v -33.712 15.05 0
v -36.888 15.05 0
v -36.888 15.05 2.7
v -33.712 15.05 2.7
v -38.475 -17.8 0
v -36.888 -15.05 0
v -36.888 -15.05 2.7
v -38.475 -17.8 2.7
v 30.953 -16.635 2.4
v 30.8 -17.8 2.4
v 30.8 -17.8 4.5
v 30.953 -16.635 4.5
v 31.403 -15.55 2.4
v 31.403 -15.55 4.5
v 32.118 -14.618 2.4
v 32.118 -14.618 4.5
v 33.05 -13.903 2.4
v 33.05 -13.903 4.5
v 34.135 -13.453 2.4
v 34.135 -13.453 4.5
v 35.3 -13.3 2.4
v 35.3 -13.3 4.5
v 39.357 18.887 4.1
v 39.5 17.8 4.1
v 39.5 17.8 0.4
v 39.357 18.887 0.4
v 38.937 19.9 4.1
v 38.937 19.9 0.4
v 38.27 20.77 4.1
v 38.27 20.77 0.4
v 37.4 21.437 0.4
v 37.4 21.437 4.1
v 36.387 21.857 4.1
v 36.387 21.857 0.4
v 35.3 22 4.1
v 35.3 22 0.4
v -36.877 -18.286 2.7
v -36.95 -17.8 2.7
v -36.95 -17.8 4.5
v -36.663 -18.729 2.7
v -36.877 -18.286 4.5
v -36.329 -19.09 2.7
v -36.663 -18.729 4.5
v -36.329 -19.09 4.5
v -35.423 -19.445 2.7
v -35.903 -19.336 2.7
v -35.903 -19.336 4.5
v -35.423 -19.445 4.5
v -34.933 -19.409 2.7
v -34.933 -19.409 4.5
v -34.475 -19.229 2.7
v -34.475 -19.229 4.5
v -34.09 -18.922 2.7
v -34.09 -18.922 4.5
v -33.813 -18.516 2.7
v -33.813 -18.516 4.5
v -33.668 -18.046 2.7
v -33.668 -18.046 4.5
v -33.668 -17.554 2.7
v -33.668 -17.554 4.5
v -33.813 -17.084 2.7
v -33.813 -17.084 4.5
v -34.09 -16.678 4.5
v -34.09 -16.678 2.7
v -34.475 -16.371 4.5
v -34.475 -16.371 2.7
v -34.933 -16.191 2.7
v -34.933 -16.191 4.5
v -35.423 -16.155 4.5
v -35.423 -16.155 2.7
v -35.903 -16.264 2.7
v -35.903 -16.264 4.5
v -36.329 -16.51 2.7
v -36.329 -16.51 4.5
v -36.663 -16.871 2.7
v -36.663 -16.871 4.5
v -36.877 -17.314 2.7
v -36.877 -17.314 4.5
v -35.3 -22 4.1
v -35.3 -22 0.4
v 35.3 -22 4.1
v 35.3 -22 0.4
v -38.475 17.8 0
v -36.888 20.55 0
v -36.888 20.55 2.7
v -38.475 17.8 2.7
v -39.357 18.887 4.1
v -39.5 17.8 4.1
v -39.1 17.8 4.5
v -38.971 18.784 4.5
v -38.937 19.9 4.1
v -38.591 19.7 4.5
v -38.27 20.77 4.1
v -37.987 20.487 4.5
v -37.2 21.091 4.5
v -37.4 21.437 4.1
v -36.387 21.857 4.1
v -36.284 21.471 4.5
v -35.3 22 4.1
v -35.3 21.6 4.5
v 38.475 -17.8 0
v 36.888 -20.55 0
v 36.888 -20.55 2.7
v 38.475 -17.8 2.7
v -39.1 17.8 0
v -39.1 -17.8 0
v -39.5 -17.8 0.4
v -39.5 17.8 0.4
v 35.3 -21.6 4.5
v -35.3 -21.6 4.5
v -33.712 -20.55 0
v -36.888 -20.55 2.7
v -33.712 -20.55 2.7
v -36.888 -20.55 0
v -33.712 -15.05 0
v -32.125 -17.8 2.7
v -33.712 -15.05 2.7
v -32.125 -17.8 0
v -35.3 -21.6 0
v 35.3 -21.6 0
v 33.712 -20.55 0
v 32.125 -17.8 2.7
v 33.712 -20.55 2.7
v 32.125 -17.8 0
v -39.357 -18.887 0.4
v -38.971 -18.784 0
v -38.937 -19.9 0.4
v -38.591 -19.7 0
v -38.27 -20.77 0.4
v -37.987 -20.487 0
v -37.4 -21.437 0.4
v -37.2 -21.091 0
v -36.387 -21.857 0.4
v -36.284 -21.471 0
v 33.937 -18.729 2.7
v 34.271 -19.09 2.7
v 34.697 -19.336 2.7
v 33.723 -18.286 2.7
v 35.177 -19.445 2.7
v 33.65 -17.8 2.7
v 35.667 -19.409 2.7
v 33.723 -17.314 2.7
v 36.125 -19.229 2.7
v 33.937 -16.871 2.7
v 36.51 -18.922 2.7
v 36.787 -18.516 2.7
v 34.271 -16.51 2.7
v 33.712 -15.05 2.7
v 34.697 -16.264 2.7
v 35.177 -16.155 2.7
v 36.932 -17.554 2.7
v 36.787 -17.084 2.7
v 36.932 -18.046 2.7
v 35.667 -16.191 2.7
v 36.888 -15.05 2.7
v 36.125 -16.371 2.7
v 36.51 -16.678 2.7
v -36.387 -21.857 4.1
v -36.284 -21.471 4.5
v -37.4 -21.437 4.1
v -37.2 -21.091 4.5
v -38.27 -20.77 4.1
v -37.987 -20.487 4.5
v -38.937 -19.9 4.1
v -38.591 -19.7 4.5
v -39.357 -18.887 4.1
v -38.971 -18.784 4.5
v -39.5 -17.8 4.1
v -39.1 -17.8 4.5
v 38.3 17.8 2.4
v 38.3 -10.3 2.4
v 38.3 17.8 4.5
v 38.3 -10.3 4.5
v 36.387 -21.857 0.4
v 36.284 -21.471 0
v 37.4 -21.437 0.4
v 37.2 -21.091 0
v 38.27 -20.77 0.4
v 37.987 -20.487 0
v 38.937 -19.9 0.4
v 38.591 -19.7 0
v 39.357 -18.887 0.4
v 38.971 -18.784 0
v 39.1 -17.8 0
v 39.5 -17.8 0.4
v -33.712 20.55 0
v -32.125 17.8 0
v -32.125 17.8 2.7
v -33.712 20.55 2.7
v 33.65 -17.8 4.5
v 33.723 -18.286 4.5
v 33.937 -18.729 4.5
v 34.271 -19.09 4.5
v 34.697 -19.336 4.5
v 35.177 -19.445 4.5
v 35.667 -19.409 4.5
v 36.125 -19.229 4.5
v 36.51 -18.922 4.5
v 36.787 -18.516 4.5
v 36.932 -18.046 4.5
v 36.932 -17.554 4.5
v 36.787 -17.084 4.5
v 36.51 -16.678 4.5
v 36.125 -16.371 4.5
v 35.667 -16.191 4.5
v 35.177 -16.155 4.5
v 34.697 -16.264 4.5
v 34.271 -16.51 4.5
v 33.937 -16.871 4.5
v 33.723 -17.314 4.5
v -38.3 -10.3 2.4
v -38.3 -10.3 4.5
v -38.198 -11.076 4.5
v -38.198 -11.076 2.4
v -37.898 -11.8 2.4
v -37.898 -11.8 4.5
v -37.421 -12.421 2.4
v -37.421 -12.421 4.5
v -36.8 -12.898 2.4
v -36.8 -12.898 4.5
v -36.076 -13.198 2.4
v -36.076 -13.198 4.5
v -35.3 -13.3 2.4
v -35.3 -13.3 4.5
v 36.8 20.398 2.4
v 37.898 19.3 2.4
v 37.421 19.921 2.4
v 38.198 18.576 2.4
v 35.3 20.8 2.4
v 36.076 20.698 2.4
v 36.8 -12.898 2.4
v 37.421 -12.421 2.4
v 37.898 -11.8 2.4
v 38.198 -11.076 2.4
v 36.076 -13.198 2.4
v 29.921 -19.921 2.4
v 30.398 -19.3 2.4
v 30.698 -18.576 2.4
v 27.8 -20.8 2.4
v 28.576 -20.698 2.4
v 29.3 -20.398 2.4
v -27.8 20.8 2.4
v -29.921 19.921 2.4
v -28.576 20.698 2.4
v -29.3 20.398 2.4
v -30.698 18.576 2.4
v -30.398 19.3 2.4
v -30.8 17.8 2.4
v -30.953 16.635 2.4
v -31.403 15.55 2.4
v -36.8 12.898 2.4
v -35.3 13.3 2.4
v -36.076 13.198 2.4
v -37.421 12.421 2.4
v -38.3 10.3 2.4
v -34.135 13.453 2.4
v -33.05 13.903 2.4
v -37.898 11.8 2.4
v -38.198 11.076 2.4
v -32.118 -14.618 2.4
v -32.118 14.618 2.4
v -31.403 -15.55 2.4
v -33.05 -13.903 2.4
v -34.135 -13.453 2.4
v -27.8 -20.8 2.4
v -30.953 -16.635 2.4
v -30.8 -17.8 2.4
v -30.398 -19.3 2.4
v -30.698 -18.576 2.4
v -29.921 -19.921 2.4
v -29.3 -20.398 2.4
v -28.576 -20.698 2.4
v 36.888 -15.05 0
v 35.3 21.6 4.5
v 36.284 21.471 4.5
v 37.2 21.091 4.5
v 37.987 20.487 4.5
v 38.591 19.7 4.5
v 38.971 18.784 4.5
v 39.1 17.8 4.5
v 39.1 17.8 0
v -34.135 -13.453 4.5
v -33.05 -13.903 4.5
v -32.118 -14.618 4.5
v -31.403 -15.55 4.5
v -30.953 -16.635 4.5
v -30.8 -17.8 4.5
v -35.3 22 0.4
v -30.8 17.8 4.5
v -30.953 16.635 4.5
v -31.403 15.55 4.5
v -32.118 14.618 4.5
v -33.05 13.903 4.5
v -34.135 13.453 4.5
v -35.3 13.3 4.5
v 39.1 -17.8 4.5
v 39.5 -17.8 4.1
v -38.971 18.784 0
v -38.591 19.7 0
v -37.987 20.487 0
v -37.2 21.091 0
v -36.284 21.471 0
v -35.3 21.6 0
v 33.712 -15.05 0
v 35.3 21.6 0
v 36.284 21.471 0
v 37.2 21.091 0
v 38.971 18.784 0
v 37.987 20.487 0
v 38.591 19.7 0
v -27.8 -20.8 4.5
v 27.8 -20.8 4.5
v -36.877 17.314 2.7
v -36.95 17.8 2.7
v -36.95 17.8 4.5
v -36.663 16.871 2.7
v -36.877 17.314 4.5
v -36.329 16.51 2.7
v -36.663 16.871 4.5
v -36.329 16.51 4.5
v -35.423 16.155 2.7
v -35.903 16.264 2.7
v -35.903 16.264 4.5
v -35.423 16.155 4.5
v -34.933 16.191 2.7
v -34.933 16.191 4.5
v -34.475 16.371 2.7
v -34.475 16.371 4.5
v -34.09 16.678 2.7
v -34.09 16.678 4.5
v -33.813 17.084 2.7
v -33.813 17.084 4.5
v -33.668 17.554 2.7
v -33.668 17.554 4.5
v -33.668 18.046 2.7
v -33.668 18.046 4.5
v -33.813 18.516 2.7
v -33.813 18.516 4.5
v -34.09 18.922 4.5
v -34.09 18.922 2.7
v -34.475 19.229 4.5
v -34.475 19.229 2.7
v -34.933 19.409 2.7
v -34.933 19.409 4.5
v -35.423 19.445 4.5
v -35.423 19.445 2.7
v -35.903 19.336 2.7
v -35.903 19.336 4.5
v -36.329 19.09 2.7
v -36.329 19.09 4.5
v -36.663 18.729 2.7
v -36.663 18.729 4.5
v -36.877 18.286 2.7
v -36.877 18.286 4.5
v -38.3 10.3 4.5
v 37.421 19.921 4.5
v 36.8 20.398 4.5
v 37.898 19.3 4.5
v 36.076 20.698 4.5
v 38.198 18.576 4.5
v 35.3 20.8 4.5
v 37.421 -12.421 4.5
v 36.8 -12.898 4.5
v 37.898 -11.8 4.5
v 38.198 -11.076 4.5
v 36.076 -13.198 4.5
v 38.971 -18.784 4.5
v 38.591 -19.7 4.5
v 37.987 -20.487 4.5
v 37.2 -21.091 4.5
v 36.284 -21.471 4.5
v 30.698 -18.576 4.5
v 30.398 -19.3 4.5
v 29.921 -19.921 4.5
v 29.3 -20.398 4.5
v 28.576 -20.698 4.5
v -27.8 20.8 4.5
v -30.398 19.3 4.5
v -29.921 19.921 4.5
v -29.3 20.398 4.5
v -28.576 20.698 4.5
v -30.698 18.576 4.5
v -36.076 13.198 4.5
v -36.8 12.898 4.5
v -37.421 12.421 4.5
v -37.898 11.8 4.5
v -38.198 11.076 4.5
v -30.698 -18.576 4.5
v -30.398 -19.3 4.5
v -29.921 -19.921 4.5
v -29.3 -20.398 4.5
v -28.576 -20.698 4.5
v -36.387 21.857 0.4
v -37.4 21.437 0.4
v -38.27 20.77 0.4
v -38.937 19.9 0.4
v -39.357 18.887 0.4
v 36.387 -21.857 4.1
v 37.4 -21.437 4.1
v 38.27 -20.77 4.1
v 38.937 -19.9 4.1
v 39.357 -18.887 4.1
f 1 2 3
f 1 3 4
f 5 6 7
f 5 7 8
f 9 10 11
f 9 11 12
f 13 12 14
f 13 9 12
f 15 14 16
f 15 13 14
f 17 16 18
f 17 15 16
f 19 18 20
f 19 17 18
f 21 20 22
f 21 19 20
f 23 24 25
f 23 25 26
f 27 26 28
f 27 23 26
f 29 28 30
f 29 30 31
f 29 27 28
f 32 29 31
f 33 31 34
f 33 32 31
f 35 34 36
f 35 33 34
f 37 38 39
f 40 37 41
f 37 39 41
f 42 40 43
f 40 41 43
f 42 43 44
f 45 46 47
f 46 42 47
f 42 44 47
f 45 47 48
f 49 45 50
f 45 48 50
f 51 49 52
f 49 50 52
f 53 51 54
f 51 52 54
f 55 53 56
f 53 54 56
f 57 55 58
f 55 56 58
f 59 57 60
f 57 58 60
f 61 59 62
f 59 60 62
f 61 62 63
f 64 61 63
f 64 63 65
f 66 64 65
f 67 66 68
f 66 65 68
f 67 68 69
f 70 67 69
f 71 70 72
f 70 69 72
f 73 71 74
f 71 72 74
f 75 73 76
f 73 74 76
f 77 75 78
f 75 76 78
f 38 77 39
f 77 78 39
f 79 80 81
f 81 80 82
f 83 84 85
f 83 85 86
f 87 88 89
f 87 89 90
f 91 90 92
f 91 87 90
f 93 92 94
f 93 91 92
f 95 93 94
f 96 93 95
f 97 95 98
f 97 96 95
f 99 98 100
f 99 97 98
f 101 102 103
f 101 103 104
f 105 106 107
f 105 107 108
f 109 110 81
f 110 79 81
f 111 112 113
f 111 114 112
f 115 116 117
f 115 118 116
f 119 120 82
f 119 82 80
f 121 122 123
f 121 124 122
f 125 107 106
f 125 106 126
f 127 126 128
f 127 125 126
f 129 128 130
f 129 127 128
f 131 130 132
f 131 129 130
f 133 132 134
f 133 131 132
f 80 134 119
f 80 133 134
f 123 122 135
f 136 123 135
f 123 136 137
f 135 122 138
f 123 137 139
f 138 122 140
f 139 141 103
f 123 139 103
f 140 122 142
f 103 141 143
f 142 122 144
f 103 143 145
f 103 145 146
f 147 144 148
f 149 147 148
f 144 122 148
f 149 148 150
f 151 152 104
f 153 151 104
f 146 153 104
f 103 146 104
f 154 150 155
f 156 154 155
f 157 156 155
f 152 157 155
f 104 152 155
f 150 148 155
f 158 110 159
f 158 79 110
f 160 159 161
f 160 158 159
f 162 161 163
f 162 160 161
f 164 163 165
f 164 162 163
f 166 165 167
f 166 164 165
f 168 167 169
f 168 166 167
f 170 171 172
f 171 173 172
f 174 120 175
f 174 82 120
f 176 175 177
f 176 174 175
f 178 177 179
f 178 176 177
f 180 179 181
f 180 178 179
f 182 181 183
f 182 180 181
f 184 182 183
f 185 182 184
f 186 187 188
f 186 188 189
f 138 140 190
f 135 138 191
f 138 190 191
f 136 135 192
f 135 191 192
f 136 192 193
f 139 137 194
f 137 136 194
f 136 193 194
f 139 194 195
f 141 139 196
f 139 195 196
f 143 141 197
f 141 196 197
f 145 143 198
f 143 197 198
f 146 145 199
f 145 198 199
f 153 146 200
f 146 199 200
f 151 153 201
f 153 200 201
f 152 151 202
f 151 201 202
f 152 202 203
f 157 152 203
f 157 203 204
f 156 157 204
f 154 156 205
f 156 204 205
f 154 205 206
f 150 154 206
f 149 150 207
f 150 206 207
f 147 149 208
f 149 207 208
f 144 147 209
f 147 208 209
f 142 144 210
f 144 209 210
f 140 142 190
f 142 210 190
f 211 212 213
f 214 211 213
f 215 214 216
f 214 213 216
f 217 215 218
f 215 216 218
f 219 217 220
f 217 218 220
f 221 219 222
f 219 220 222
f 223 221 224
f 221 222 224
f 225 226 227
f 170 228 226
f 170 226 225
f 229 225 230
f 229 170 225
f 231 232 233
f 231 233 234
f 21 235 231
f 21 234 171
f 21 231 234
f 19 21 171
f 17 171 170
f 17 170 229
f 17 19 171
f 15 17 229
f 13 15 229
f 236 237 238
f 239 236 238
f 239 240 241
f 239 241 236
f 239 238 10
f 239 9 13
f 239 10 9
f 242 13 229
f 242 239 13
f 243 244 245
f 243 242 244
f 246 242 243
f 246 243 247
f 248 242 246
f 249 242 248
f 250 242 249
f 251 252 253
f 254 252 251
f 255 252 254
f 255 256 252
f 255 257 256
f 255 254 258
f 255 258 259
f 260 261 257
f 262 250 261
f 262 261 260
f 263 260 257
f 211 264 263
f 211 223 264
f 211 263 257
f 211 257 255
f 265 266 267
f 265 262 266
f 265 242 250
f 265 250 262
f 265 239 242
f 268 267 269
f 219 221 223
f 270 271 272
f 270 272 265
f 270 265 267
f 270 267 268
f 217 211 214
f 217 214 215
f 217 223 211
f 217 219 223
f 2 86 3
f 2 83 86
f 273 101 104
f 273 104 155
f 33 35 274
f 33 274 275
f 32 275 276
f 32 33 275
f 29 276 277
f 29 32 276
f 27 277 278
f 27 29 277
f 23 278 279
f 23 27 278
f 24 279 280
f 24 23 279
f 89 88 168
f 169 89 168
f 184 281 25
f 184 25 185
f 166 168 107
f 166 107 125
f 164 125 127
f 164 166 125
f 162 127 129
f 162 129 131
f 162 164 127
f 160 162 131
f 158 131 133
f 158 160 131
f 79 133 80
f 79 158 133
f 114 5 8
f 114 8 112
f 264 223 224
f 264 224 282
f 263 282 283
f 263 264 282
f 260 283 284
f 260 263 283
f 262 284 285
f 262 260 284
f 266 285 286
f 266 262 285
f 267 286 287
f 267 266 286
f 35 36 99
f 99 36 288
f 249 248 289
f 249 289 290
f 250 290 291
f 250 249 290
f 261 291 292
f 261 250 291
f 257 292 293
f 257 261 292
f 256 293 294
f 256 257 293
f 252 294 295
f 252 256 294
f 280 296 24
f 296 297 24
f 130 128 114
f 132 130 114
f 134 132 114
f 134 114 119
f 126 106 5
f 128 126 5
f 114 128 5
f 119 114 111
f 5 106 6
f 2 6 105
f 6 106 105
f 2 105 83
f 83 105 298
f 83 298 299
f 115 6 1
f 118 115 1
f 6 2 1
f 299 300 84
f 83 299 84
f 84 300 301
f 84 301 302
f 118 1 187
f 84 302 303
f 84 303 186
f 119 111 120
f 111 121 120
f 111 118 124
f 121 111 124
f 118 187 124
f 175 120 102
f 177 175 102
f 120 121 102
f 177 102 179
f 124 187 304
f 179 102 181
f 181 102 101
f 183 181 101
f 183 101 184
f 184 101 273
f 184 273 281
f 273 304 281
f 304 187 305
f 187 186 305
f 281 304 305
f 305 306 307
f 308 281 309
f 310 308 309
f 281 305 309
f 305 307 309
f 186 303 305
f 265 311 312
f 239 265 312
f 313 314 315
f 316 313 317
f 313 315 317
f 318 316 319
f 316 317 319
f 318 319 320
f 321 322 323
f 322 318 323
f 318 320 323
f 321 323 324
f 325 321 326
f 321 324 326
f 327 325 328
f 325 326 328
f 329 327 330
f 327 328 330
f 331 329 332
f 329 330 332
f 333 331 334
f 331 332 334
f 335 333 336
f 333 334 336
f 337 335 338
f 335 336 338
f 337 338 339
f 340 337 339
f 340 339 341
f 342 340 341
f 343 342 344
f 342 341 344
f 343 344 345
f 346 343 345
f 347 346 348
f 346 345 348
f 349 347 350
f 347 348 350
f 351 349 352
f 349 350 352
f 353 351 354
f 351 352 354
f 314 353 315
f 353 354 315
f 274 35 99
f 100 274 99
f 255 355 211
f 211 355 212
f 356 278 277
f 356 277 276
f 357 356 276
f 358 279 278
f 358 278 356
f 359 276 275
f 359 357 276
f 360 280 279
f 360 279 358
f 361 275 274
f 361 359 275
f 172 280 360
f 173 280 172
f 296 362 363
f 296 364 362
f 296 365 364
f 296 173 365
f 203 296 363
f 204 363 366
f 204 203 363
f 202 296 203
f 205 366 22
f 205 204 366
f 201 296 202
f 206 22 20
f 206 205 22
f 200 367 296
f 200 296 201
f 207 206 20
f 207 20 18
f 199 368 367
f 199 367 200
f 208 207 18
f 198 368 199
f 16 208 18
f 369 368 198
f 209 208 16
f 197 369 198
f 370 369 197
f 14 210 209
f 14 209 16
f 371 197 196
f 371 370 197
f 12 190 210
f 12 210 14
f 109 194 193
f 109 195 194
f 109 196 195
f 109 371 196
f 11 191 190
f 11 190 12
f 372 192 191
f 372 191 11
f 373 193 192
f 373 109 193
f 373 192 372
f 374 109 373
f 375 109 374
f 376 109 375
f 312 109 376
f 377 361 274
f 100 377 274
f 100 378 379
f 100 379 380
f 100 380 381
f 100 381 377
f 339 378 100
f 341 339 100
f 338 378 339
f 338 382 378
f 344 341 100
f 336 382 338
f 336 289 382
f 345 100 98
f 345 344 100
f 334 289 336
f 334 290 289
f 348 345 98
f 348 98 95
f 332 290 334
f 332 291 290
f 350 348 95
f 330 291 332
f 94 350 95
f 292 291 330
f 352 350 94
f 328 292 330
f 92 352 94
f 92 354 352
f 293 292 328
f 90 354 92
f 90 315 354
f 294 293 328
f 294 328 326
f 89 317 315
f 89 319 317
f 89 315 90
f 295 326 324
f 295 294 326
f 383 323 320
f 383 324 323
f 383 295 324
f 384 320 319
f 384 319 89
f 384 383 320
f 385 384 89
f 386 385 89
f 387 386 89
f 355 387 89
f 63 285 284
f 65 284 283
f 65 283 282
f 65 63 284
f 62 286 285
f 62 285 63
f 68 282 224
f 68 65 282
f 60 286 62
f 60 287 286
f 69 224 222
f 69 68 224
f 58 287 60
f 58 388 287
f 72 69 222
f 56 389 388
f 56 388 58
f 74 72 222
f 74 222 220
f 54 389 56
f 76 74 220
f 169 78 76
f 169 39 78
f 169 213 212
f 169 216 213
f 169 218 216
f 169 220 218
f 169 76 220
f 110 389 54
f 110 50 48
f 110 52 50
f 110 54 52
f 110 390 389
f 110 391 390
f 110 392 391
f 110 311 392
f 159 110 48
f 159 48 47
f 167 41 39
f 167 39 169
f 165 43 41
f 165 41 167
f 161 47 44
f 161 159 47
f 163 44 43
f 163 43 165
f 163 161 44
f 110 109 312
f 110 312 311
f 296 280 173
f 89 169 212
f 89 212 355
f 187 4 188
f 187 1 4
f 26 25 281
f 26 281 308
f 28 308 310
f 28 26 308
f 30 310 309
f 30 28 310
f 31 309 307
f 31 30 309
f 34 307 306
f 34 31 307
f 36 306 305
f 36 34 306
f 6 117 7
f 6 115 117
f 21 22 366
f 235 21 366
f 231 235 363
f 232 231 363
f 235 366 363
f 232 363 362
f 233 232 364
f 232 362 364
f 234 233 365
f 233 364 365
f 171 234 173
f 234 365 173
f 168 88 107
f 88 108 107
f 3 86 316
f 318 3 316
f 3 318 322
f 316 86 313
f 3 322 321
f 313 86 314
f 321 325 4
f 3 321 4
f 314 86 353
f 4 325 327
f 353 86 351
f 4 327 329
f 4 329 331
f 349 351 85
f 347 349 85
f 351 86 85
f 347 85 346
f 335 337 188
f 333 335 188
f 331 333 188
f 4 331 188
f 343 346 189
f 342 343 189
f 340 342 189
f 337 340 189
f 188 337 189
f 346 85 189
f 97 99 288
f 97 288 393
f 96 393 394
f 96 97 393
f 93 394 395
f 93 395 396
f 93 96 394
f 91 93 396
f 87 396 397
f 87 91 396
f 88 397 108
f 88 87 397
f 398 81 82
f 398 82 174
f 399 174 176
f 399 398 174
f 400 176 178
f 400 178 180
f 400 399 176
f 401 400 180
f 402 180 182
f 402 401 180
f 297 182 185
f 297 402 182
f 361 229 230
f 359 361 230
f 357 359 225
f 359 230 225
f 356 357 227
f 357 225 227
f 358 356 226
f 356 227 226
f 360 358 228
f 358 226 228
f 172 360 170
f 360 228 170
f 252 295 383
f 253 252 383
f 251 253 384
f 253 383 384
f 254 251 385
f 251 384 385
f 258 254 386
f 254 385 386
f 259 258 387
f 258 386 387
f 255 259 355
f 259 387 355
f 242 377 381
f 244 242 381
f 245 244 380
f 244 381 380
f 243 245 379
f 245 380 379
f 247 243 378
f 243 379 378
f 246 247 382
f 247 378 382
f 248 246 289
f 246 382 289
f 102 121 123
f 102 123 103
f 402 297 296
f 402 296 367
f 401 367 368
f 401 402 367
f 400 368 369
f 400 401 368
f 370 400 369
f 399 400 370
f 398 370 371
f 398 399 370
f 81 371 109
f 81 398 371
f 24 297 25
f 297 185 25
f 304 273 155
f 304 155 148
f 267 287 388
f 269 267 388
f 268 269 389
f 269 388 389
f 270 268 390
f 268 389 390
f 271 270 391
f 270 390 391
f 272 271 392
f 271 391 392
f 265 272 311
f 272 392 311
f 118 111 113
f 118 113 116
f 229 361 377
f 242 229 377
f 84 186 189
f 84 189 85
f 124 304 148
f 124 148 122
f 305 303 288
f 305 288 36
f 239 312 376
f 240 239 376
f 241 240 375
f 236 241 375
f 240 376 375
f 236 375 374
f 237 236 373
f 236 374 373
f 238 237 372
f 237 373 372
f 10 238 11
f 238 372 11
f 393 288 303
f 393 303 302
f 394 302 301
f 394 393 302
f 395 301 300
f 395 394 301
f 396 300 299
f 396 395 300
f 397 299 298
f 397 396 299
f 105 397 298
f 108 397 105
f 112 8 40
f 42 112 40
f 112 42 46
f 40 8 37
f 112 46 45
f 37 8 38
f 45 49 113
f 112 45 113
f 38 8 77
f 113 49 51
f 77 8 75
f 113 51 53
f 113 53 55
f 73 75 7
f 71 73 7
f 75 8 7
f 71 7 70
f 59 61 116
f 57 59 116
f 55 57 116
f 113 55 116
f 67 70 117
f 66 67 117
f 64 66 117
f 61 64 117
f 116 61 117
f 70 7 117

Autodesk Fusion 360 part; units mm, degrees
sketch "Sketch1" plane through (0, 0, 0) normal (0, 0, 1) x (1, 0, 0)
  line L0 (39.5, 22) -> (-39.5, 22)
  line L1 (-39.5, 22) -> (-39.5, -22)
  line L2 (-39.5, -22) -> (39.5, -22)
  line L3 (39.5, -22) -> (39.5, 22)
  line L4 (39.5, 22) -> (-39.5, -22) construction
  line L5 (-39.5, 22) -> (39.5, -22) construction
  dimension "d1" = 44
  dimension "d2" = 79
extrude "Extrude1" add sketch "Sketch1" along normal blind 4.5
sketch "Sketch2" plane through (0, 0, 4.5) normal (0, 0, 1) x (-1, 0, 0)
  line L0 (-39.5, 22) -> (-39.5, -22)
  line L1 (-39.5, -22) -> (39.5, -22)
  line L2 (39.5, -22) -> (39.5, 22)
  line L3 (39.5, 22) -> (-39.5, 22)
  line L4 (-38.3, 20.8) -> (-38.3, -20.8)
  line L5 (-38.3, -20.8) -> (38.3, -20.8)
  line L6 (38.3, -20.8) -> (38.3, 20.8)
  line L7 (38.3, 20.8) -> (-38.3, 20.8)
  dimension "d5" = -1.2
extrude "Extrude2" cut sketch "Sketch2" against normal blind 2.1 contours L4 L5 L6 L7
sketch "Sketch3" plane through (0, 0, 2.4) normal (0, 0, 1) x (-1, 0, 0)
  line L0 (38.3, 20.8) -> (-38.3, 20.8)
  line L1 (-38.3, 20.8) -> (-38.3, -20.8)
  line L2 (-38.3, -20.8) -> (38.3, -20.8)
  line L3 (38.3, -20.8) -> (38.3, 20.8)
  line L4 (-38.3, -20.8) -> (-38.3, 20.8)
  line L5 (-38.3, 20.8) -> (38.3, 20.8)
  line L6 (38.3, 20.8) -> (38.3, -20.8)
  line L7 (38.3, -20.8) -> (-38.3, -20.8)
  line L8 (-39.5, 22) -> (-39.5, -22)
  line L9 (-39.5, -22) -> (39.5, -22)
  line L10 (39.5, -22) -> (39.5, 22)
  line L11 (39.5, 22) -> (-39.5, 22)
  circle A0 centre (35.3, -17.8) radius 4.5
  circle A1 centre (-35.3, 17.8) radius 4.5
  circle A2 centre (35.3, 17.8) radius 4.5
  dimension "d8" = 9
  dimension "d9" = 3
  dimension "d10" = 3
  dimension "d11" = 9
  dimension "d12" = 9
  dimension "d13" = 3
  dimension "d14" = 3
  dimension "d15" = 3
  dimension "d16" = 3
extrude "Extrude3" add sketch "Sketch3" along normal blind 2.1 contours L2 L3 L6 L7 A0
extrude "Extrude4" add sketch "Sketch3" along normal blind 2.1 contours L0 L3 L5 L6 A2
extrude "Extrude5" add sketch "Sketch3" along normal blind 2.1 contours L0 L1 L4 L5 A1
sketch "Sketch5" plane through (0, 0, 4.5) normal (0, 0, 1) x (-1, 0, 0)
  line L0 (-38.3, -20.8) -> (-38.3, 14.4459)
  arc A0 (-38.3, 14.4459) -> (-31.9459, 20.8) centre (-35.3, 17.8) ccw
  line L1 (-31.9459, 20.8) -> (31.9459, 20.8)
  arc A1 (31.9459, 20.8) -> (38.3, 14.4459) centre (35.3, 17.8) ccw
  line L2 (38.3, 14.4459) -> (38.3, -14.4459)
  arc A2 (38.3, -14.4459) -> (31.9459, -20.8) centre (35.3, -17.8) ccw
  line L3 (31.9459, -20.8) -> (-38.3, -20.8)
  line L4 (-39.5, 22) -> (-39.5, -22)
  line L5 (-39.5, -22) -> (39.5, -22)
  line L6 (39.5, -22) -> (39.5, 22)
  line L7 (39.5, 22) -> (-39.5, 22)
  circle A3 centre (35.3, -17.8) radius 1.65
  circle A4 centre (35.3, 17.8) radius 1.65
  circle A5 centre (-35.3, 17.8) radius 1.65
  point P0 (35.3, -17.8)
  dimension "d44" = 3.3
  dimension "d45" = 3.3
  dimension "d46" = 3.3
extrude "Extrude7" cut sketch "Sketch5" against normal blind 13 contours A3
extrude "Extrude8" cut sketch "Sketch5" against normal blind 18 contours A4
extrude "Extrude9" cut sketch "Sketch5" against normal blind 16 contours A5
sketch "Sketch6" plane through (0, 0, 0) normal (0, 0, 1) x (1, 0, 0)
  circle A0 centre (35.3, -17.8) radius 1.65
  circle A1 centre (-35.3, -17.8) radius 1.65
  circle A2 centre (-35.3, 17.8) radius 1.65
  line L0 (39.5, 22) -> (39.5, -22)
  line L1 (39.5, -22) -> (-39.5, -22)
  line L2 (-39.5, -22) -> (-39.5, 22)
  line L3 (-39.5, 22) -> (39.5, 22)
  line L4 (-32.1246, -17.8) -> (-33.7123, -15.05)
  line L5 (-33.7123, -15.05) -> (-36.8877, -15.05)
  line L6 (-36.8877, -15.05) -> (-38.4754, -17.8)
  line L7 (-38.4754, -17.8) -> (-36.8877, -20.55)
  line L8 (-36.8877, -20.55) -> (-33.7123, -20.55)
  line L9 (-33.7123, -20.55) -> (-32.1246, -17.8)
  line L10 (-32.1246, 17.8) -> (-33.7123, 20.55)
  line L11 (-33.7123, 20.55) -> (-36.8877, 20.55)
  line L12 (-36.8877, 20.55) -> (-38.4754, 17.8)
  line L13 (-38.4754, 17.8) -> (-36.8877, 15.05)
  line L14 (-36.8877, 15.05) -> (-33.7123, 15.05)
  line L15 (-33.7123, 15.05) -> (-32.1246, 17.8)
  line L16 (32.1246, -17.8) -> (33.7123, -20.55)
  line L17 (33.7123, -20.55) -> (36.8877, -20.55)
  line L18 (36.8877, -20.55) -> (38.4754, -17.8)
  line L19 (38.4754, -17.8) -> (36.8877, -15.05)
  line L20 (36.8877, -15.05) -> (33.7123, -15.05)
  line L21 (33.7123, -15.05) -> (32.1246, -17.8)
  point P0 (-35.3, -17.8)
  point P1 (-35.3, 17.8)
  point P2 (35.3, -17.8)
  dimension "d53" = 2.75
  dimension "d54" = 2.75
  dimension "d55" = 2.75
extrude "Extrude10" cut sketch "Sketch6" along normal blind 2.7 contours L10 L11 L12 L13 L14 L15
extrude "Extrude11" cut sketch "Sketch6" along normal blind 2.7 contours L16 L17 L18 L19 L20 L21
extrude "Extrude12" cut sketch "Sketch6" along normal blind 2.7 contours L4 L5 L6 L7 L8 L9
sketch "Sketch7" plane through (0, 0, 0) normal (0, 0, 1) x (1, 0, 0)
  line L0 (-36.8877, -20.55) -> (-33.7123, -20.55)
  line L1 (-33.7123, -20.55) -> (-32.1246, -17.8)
  line L2 (-32.1246, -17.8) -> (-33.7123, -15.05)
  line L3 (-33.7123, -15.05) -> (-36.8877, -15.05)
  line L4 (-36.8877, -15.05) -> (-38.4754, -17.8)
  line L5 (-38.4754, -17.8) -> (-36.8877, -20.55)
  line L6 (36.8877, -15.05) -> (33.7123, -15.05)
  line L7 (33.7123, -15.05) -> (32.1246, -17.8)
  line L8 (32.1246, -17.8) -> (33.7123, -20.55)
  line L9 (33.7123, -20.55) -> (36.8877, -20.55)
  line L10 (36.8877, -20.55) -> (38.4754, -17.8)
  line L11 (38.4754, -17.8) -> (36.8877, -15.05)
  line L12 (-36.8877, 15.05) -> (-33.7123, 15.05)
  line L13 (-33.7123, 15.05) -> (-32.1246, 17.8)
  line L14 (-32.1246, 17.8) -> (-33.7123, 20.55)
  line L15 (-33.7123, 20.55) -> (-36.8877, 20.55)
  line L16 (-36.8877, 20.55) -> (-38.4754, 17.8)
  line L17 (-38.4754, 17.8) -> (-36.8877, 15.05)
  line L18 (39.5, 22) -> (39.5, -22)
  line L19 (39.5, -22) -> (-39.5, -22)
  line L20 (-39.5, -22) -> (-39.5, 22)
  line L21 (-39.5, 22) -> (39.5, 22)
fillet "Fillet1" radius 3 2 edges at (-31.9459, 20.8, 3.45) (-38.3, 14.4459, 3.45)
fillet "Fillet2" radius 3 2 edges at (-31.9459, -20.8, 3.45) (-38.3, -14.4459, 3.45)
fillet "Fillet3" radius 3 2 edges at (31.9459, -20.8, 3.45) (38.3, -14.4459, 3.45)
fillet "Fillet4" radius 4.2 1 edges at (39.5, -22, 2.25)
fillet "Fillet5" radius 3 1 edges at (38.3, 20.8, 3.45)
fillet "Fillet6" radius 4.2 1 edges at (-39.5, -22, 2.25)
fillet "Fillet7" radius 4.2 1 edges at (-39.5, 22, 2.25)
fillet "Fillet8" radius 4.2 1 edges at (39.5, 22, 2.25)
chamfer "Chamfer1" distance 0.4 angle 45 8 edges at (0, -22, 4.5) (38.2698, -20.7698, 4.5) (39.5, 0, 4.5) (38.2698, 20.7698, 4.5) (0, 22, 4.5) (-38.2698, 20.7698, 4.5) (-39.5, 0, 4.5) (-38.2698, -20.7698, 4.5)
chamfer "Chamfer2" distance 0.4 angle 45 8 edges at (0, -22, 0) (38.2698, -20.7698, 0) (39.5, 0, 0) (38.2698, 20.7698, 0) (0, 22, 0) (-38.2698, 20.7698, 0) (-39.5, 0, 0) (-38.2698, -20.7698, 0)
equation "d53 = ( 5.5 / 2 ) * 1 mm"
equation "d54 = ( 5.5 / 2 ) * 1 mm"
equation "d55 = ( 5.5 / 2 ) * 1 mm"
